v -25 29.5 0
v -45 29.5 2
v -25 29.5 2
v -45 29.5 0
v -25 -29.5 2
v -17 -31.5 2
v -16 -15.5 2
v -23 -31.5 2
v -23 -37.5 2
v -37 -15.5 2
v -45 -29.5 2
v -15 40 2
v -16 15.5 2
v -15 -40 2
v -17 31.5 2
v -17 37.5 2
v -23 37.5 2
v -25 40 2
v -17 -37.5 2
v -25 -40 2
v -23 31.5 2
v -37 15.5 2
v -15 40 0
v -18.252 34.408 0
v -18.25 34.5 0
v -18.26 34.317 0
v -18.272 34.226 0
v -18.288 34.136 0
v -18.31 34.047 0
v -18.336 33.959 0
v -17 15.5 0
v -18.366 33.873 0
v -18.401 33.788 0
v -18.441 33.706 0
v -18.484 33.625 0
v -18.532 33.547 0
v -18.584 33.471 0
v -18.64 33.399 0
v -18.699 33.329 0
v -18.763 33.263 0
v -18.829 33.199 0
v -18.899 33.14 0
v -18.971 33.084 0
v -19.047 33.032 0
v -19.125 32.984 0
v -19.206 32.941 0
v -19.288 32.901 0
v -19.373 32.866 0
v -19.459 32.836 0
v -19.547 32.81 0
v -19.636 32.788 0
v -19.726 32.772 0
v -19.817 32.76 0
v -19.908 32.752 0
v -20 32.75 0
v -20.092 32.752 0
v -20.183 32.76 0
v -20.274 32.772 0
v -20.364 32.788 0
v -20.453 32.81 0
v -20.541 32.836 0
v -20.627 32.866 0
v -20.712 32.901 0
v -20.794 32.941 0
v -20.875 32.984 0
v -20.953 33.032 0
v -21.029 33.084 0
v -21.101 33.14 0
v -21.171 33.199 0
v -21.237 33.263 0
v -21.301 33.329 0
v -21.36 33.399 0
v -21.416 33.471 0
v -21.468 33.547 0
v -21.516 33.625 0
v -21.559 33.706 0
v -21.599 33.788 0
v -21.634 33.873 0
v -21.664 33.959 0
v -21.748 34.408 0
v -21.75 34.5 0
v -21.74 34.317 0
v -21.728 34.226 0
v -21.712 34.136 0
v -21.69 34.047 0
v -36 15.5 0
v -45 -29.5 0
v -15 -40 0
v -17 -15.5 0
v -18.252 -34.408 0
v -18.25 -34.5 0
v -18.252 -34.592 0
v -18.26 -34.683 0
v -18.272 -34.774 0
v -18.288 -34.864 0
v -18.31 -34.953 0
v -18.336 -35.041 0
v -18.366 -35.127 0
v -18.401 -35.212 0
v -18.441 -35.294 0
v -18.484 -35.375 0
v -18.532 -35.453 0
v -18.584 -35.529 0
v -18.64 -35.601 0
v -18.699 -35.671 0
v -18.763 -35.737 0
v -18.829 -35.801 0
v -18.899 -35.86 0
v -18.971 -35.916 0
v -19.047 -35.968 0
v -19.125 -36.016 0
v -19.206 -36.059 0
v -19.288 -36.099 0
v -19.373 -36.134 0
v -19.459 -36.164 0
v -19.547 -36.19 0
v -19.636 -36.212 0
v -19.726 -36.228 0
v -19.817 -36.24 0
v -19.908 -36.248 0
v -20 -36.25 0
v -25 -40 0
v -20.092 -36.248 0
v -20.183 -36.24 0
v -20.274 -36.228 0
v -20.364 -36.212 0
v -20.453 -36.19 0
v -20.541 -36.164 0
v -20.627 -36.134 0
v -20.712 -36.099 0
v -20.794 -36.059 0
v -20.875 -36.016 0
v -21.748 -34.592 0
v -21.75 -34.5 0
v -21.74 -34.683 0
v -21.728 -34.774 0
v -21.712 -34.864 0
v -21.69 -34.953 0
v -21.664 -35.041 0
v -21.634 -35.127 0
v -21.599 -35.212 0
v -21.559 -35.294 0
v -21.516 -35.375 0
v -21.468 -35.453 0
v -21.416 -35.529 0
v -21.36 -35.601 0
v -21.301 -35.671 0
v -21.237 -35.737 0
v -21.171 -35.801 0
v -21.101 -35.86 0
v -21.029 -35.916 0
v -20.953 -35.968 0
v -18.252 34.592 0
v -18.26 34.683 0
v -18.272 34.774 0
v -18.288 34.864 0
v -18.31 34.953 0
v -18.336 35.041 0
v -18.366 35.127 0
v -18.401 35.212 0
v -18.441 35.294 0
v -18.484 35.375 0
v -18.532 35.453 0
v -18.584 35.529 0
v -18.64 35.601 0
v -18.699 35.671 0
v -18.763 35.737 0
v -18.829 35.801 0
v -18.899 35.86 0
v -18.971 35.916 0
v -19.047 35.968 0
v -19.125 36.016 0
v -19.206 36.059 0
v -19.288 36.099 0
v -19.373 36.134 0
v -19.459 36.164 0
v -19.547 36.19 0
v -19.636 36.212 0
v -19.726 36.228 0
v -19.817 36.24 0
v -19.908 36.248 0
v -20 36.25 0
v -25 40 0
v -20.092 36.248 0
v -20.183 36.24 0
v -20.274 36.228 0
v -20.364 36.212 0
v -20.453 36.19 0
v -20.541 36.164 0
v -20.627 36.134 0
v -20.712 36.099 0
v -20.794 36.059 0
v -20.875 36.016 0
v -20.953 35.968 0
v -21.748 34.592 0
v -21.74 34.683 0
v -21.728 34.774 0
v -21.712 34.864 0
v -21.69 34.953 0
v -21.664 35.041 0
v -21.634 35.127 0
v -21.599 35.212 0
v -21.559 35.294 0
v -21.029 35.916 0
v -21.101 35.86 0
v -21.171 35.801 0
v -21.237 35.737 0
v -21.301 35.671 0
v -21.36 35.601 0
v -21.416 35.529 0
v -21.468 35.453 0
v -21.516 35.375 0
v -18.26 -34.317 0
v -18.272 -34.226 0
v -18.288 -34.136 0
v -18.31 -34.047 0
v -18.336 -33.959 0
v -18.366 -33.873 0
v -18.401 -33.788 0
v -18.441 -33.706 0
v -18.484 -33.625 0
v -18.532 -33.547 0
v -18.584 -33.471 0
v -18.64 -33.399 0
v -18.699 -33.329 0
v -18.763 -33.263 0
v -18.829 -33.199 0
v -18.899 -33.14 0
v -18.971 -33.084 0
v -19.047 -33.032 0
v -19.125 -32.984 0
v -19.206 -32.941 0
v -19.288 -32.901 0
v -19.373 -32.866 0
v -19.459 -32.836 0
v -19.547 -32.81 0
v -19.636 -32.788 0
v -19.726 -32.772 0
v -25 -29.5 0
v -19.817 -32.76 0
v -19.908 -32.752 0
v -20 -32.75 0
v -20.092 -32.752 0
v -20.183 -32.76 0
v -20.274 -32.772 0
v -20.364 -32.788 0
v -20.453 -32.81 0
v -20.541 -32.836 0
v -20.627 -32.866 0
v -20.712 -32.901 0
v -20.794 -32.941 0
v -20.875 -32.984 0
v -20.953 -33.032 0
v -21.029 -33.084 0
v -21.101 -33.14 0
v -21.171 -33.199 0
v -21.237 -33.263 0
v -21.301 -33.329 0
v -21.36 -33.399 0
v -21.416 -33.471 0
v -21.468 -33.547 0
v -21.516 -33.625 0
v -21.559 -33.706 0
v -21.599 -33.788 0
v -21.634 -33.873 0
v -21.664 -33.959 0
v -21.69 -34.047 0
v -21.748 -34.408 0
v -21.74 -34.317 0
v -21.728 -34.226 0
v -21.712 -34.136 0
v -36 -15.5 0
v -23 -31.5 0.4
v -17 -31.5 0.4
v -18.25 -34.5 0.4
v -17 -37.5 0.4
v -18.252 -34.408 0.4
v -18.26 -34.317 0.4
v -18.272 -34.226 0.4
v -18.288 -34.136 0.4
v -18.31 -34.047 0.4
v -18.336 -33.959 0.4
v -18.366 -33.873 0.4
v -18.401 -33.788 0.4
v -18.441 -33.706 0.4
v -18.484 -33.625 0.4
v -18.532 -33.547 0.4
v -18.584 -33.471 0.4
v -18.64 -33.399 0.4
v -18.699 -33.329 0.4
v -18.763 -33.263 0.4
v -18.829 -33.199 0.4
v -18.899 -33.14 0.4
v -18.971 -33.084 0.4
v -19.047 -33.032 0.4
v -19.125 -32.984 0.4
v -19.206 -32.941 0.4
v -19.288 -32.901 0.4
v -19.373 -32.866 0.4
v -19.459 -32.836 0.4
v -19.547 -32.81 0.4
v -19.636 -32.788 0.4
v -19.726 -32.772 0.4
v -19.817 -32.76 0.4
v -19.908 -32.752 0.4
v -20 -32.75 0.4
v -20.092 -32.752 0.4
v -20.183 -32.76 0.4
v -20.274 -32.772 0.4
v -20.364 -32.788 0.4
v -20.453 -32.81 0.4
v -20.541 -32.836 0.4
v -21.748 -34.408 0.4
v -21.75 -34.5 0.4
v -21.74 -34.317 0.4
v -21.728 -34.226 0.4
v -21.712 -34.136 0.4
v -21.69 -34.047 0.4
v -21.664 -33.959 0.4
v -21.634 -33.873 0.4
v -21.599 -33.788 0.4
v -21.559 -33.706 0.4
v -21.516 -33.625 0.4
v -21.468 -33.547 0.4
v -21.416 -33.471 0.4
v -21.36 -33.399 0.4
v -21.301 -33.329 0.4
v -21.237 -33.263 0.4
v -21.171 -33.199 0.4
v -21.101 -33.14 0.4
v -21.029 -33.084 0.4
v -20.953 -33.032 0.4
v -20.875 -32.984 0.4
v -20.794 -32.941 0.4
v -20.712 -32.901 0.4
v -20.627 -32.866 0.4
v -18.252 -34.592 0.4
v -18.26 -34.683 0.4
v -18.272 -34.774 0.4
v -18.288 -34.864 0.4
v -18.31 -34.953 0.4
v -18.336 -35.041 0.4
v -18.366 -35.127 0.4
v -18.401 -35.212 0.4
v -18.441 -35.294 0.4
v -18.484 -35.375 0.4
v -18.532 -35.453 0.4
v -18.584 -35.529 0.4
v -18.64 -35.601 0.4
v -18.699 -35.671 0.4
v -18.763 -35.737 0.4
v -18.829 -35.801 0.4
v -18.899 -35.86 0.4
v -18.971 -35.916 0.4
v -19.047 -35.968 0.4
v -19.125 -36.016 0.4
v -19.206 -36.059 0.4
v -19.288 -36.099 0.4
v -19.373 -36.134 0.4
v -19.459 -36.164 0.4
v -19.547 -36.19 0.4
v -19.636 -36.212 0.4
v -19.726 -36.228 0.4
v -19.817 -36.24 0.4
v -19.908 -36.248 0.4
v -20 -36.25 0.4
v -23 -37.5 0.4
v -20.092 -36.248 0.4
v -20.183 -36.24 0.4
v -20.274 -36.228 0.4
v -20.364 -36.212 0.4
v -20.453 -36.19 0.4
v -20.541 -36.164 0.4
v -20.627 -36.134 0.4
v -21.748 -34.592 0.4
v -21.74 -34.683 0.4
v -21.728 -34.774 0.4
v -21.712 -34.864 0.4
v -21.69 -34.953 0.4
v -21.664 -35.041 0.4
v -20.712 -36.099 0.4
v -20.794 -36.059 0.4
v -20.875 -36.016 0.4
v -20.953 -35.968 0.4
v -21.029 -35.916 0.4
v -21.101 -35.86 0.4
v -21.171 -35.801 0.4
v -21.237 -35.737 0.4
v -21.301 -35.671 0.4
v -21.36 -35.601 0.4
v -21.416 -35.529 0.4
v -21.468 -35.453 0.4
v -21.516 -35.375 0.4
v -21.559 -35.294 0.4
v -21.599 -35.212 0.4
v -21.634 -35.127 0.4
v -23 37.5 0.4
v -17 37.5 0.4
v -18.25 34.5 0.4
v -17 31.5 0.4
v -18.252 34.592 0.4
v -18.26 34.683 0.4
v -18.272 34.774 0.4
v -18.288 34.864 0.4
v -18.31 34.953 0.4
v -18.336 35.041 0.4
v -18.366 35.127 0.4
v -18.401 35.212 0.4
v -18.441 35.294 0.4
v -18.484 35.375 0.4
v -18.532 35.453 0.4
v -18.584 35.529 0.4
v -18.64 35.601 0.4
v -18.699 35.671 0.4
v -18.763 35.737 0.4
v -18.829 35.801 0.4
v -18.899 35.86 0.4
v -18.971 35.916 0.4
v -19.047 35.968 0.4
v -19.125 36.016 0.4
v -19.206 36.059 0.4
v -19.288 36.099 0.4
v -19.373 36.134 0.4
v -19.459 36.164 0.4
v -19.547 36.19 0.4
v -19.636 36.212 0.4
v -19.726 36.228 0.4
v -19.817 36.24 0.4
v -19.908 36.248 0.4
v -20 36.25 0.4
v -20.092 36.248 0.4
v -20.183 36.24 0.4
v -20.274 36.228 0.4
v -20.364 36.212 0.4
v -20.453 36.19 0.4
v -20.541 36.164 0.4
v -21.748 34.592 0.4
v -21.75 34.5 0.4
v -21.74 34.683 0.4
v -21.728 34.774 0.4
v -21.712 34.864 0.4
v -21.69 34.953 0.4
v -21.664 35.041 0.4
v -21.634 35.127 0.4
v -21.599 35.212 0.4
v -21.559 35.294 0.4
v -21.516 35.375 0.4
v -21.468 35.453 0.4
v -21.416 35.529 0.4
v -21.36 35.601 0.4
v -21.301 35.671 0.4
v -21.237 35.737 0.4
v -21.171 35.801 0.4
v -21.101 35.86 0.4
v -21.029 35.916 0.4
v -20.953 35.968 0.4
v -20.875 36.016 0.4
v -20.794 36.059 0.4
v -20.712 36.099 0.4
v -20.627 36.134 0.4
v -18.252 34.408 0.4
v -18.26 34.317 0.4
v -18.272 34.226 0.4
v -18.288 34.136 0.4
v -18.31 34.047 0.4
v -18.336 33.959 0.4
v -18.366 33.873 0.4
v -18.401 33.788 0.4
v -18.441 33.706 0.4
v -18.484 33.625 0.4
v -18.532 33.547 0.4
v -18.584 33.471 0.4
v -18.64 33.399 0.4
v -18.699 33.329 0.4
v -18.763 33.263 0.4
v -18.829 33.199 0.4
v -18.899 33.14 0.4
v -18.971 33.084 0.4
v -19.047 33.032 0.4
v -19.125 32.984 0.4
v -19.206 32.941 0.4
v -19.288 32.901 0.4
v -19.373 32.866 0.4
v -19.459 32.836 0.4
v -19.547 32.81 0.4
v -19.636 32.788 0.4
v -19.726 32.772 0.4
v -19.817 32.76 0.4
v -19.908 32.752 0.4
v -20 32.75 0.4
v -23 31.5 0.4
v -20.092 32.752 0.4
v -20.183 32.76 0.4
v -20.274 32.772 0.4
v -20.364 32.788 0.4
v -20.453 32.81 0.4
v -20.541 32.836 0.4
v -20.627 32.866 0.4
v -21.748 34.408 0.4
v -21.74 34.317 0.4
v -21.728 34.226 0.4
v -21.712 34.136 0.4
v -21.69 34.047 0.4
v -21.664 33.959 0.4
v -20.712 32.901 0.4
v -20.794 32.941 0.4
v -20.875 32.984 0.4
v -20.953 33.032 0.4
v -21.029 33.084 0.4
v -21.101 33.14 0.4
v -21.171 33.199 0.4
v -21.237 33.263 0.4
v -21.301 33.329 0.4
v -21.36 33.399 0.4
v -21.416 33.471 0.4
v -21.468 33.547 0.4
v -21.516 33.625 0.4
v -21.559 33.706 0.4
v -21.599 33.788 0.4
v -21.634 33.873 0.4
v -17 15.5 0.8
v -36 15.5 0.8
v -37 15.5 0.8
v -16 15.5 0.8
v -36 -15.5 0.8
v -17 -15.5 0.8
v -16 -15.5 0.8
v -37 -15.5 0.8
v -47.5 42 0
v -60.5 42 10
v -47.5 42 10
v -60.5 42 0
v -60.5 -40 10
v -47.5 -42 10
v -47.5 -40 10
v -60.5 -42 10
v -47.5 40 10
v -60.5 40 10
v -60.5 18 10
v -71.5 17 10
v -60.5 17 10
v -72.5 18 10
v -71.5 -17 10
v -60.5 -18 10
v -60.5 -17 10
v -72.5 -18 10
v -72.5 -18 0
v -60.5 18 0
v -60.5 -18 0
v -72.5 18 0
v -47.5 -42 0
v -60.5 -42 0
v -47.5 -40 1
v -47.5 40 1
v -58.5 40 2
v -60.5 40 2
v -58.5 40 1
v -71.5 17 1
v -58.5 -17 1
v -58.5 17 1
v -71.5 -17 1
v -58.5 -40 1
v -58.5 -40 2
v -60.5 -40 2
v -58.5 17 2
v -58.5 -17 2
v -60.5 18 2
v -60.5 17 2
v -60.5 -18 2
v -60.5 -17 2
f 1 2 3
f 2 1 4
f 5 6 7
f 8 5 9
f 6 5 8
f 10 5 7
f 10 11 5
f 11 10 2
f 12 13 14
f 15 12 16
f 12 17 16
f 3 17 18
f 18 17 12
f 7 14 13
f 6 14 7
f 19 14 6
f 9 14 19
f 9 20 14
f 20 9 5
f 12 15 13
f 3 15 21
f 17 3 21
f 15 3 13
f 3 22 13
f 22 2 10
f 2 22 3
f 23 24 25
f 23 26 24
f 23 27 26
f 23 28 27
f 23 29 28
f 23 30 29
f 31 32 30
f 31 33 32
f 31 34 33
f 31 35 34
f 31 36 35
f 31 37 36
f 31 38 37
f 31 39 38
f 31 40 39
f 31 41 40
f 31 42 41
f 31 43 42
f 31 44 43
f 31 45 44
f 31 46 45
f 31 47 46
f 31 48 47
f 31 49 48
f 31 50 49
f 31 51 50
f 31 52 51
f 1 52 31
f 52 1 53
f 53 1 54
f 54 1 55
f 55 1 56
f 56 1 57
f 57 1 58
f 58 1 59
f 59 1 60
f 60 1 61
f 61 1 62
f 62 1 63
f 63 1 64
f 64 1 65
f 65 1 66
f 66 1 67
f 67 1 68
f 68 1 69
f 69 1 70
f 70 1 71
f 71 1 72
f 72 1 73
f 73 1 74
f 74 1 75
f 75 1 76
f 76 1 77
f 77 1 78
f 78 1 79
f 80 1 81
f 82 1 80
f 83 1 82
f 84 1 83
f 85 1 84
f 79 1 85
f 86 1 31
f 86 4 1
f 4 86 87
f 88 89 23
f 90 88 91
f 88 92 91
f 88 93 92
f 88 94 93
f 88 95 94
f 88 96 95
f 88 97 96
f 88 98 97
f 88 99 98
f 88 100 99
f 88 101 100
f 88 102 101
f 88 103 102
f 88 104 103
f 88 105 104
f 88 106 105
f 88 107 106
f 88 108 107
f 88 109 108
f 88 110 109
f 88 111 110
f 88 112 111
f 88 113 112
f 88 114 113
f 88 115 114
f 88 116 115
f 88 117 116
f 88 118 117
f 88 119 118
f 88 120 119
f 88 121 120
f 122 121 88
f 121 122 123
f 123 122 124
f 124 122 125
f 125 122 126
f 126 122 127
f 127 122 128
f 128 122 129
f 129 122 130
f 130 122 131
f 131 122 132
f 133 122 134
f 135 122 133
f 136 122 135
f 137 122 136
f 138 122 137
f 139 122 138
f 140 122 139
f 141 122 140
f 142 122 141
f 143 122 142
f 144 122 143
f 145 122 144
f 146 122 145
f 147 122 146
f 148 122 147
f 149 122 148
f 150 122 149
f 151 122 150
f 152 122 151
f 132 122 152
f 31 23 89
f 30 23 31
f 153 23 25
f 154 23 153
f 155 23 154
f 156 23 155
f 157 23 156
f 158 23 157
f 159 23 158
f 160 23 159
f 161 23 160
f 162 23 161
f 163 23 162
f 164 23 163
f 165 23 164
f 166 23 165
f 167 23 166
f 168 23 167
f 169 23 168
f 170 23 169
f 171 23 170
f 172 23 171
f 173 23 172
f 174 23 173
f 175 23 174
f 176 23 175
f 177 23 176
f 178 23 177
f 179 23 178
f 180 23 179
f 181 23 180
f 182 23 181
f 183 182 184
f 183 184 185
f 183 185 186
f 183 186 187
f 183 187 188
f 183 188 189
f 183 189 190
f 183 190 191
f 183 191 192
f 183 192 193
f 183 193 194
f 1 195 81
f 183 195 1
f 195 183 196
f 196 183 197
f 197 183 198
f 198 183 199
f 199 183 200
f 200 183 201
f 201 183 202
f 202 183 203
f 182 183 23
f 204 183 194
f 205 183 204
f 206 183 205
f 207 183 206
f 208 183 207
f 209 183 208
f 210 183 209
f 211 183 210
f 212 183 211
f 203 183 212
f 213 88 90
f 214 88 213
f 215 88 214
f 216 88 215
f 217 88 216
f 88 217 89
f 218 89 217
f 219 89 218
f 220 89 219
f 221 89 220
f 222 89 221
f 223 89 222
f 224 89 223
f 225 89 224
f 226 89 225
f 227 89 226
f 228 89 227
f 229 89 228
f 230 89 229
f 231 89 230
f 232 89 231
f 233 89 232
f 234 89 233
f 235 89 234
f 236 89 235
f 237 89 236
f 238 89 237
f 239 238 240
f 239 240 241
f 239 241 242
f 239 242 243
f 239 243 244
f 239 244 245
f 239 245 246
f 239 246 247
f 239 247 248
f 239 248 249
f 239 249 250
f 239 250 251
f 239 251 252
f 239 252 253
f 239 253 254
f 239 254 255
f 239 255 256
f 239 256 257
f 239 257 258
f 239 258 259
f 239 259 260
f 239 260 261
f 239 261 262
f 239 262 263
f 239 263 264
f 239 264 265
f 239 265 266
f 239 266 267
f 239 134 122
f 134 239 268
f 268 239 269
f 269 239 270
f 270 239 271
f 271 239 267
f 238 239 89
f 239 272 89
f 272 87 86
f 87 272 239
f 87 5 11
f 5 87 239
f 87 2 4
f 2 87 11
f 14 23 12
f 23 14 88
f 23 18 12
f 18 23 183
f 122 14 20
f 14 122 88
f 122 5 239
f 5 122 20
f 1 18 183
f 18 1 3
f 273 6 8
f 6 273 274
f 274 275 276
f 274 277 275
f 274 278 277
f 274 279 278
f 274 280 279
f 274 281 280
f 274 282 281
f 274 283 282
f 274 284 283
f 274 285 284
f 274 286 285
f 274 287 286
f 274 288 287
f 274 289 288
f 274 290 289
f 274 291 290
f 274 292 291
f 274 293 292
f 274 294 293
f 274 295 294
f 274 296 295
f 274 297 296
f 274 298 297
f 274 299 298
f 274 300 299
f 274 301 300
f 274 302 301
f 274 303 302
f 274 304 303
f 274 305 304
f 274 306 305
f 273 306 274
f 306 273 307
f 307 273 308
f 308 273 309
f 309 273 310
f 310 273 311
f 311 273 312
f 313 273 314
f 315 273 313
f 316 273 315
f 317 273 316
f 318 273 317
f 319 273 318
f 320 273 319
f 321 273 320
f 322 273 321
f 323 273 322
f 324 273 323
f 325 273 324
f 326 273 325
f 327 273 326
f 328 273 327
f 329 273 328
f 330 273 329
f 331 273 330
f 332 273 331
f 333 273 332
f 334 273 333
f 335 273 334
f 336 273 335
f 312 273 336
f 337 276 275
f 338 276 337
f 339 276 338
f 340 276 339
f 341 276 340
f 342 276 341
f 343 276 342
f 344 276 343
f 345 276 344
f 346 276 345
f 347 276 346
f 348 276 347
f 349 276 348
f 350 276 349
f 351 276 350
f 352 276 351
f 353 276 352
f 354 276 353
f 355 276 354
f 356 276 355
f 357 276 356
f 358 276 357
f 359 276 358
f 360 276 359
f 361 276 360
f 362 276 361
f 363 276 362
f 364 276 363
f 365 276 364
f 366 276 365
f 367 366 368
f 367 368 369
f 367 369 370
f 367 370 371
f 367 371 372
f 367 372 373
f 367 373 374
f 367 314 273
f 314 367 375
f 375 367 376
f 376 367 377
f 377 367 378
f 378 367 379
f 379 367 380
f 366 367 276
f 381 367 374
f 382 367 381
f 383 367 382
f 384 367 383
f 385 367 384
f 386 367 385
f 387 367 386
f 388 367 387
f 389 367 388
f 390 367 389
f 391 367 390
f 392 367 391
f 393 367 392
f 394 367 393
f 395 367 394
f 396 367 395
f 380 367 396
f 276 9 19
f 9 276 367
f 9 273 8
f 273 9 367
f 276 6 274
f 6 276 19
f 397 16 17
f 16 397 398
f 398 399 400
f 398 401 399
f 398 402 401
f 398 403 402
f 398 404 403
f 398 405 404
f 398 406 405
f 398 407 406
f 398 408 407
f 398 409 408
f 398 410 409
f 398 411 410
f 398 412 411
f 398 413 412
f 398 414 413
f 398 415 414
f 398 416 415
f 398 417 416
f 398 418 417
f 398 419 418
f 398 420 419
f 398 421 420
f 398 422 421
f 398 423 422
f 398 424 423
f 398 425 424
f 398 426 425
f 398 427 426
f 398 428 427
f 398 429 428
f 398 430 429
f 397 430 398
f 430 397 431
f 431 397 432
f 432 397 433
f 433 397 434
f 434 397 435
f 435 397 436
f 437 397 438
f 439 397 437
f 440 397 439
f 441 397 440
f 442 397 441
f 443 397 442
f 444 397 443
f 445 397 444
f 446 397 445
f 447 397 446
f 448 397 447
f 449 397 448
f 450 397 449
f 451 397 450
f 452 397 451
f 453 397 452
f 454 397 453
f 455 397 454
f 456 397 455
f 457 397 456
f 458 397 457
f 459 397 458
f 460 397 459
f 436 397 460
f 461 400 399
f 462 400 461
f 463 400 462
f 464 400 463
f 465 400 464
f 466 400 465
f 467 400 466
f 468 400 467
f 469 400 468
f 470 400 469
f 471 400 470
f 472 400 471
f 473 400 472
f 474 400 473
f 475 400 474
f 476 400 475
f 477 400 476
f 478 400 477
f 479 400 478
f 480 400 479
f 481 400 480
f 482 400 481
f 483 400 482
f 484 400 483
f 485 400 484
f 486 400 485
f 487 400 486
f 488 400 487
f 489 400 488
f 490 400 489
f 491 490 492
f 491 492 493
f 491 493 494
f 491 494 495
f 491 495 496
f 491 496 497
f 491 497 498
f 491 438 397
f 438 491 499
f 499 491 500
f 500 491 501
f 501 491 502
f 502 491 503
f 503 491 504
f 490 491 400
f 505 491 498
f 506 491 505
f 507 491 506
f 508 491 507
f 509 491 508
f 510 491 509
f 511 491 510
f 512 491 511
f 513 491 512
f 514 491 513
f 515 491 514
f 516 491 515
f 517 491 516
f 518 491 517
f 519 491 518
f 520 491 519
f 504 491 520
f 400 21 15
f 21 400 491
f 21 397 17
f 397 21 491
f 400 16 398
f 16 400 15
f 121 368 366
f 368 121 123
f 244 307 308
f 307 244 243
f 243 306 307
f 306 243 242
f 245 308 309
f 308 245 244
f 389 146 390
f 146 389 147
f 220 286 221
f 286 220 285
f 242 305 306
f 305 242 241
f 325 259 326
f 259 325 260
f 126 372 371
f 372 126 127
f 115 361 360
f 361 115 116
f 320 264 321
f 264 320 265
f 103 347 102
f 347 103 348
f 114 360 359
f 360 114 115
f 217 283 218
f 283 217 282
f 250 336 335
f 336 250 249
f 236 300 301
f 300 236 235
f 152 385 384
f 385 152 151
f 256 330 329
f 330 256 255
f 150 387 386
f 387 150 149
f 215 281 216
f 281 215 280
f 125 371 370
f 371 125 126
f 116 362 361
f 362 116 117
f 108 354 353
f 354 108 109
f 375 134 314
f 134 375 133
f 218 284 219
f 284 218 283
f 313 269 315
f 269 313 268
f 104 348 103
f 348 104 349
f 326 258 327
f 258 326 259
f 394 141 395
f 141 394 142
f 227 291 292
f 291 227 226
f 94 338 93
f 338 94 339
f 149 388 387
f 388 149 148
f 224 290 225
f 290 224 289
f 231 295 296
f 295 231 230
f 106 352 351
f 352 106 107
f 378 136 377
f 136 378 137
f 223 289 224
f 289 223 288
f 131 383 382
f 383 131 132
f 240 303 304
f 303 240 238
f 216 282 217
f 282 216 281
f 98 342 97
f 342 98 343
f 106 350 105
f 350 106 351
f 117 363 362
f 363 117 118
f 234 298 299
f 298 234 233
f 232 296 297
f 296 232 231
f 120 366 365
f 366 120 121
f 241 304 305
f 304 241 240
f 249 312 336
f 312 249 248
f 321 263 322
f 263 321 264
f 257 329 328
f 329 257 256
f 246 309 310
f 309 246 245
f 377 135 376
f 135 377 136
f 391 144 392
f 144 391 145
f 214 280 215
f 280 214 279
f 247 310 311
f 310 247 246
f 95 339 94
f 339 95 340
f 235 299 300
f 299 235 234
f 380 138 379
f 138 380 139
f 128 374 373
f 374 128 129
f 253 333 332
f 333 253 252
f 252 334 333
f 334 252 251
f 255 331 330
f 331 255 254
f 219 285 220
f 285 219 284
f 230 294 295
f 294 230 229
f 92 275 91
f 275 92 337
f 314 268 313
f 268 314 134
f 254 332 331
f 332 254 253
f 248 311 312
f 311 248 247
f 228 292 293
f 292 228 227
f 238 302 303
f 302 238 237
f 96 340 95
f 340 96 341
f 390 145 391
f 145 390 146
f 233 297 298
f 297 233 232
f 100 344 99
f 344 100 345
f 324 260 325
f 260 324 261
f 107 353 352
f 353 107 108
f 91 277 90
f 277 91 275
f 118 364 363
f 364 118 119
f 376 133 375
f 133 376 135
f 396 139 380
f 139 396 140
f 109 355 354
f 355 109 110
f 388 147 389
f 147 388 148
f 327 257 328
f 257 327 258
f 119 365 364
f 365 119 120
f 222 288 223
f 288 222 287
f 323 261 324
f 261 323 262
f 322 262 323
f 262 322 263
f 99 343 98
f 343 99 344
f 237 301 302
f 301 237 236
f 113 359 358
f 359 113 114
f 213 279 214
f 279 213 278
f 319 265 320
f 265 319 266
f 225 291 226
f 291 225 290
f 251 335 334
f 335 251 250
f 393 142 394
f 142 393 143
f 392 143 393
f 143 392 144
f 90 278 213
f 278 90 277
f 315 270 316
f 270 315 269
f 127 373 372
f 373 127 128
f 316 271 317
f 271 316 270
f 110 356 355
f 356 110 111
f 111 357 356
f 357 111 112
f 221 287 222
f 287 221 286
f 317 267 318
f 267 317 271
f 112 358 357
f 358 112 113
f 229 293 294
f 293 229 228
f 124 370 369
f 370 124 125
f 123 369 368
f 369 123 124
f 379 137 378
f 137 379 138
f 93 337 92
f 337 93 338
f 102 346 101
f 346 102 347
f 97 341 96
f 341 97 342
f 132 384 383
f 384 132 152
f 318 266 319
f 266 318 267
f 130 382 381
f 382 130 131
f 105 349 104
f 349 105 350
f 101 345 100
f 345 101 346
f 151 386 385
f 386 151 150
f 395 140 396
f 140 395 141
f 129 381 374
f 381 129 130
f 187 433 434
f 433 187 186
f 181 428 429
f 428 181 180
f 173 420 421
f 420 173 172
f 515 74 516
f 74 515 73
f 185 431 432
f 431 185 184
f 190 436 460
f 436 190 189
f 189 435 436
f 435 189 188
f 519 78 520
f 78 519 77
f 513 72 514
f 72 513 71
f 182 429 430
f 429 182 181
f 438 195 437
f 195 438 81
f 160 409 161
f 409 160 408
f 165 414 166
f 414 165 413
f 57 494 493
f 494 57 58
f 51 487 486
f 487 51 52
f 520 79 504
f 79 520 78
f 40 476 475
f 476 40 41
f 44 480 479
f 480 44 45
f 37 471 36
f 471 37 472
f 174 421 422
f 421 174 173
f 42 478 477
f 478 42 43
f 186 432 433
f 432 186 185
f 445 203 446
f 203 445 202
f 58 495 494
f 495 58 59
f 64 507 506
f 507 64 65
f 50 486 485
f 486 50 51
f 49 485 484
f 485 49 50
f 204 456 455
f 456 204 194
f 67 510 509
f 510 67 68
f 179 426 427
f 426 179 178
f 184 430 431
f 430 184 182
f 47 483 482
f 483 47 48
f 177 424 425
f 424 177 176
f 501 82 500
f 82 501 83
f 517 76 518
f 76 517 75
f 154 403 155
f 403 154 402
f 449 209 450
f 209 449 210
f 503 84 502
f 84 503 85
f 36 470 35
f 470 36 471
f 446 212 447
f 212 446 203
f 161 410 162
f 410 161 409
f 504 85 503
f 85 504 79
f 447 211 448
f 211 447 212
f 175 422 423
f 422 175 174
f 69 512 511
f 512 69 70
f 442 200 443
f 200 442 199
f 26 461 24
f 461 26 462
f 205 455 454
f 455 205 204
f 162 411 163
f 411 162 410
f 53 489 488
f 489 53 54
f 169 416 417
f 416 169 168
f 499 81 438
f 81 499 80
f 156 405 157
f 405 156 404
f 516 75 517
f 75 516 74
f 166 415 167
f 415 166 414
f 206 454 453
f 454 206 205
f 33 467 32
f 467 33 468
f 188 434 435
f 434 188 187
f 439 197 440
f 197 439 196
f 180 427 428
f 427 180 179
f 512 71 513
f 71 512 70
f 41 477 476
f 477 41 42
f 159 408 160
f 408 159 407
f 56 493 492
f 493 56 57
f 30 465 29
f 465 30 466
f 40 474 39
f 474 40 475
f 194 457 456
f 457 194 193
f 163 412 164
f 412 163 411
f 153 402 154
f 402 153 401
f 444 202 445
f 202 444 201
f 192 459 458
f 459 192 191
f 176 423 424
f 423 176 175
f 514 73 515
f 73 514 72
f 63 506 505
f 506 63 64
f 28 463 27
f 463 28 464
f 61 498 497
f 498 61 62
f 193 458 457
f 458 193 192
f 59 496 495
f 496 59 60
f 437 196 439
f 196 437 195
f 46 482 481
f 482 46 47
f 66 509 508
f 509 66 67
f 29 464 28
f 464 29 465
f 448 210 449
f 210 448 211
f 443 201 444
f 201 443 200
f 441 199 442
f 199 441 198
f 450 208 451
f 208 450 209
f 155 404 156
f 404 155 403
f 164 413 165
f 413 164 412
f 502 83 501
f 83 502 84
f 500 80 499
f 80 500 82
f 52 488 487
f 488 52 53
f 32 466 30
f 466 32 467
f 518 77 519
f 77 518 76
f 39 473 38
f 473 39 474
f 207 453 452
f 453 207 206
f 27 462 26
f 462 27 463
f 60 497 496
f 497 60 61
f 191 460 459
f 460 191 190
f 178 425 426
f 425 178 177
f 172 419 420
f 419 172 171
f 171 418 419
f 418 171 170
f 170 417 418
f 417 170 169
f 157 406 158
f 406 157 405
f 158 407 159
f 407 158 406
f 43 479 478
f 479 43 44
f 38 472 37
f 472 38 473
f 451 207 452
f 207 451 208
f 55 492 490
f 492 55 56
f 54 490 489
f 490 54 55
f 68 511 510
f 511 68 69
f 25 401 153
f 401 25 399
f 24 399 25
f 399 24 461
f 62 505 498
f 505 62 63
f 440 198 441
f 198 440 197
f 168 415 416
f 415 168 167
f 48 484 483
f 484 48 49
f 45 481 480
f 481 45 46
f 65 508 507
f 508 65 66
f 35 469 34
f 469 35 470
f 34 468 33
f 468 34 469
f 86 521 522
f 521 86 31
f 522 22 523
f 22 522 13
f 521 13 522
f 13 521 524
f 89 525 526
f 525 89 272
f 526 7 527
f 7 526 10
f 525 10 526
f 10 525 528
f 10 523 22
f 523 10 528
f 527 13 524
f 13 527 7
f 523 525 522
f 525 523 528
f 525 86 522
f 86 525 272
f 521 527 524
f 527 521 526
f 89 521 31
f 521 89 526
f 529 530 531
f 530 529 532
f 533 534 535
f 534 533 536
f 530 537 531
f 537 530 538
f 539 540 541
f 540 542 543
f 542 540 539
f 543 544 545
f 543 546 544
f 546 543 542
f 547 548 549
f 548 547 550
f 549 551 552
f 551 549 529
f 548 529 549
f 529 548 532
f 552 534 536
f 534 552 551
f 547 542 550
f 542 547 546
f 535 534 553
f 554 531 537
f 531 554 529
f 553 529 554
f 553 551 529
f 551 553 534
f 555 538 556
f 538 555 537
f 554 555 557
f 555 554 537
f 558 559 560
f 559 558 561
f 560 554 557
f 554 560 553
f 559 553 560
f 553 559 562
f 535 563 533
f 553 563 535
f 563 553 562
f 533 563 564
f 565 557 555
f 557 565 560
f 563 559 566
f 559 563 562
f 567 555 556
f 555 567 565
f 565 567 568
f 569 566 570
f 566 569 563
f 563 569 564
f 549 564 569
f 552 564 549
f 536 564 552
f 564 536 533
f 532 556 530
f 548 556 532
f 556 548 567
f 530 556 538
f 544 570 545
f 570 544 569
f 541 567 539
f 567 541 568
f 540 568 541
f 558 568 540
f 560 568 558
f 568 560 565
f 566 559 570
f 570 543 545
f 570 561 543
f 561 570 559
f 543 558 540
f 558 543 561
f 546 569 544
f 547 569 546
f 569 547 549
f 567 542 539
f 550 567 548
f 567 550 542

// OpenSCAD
include <hal9000.scad>

conf_panel_rfid = true;
conf_panel_motion = true;

rotate([+00.0,+00.0,+90.0]) hal9000_enclosure_panel_addons();
